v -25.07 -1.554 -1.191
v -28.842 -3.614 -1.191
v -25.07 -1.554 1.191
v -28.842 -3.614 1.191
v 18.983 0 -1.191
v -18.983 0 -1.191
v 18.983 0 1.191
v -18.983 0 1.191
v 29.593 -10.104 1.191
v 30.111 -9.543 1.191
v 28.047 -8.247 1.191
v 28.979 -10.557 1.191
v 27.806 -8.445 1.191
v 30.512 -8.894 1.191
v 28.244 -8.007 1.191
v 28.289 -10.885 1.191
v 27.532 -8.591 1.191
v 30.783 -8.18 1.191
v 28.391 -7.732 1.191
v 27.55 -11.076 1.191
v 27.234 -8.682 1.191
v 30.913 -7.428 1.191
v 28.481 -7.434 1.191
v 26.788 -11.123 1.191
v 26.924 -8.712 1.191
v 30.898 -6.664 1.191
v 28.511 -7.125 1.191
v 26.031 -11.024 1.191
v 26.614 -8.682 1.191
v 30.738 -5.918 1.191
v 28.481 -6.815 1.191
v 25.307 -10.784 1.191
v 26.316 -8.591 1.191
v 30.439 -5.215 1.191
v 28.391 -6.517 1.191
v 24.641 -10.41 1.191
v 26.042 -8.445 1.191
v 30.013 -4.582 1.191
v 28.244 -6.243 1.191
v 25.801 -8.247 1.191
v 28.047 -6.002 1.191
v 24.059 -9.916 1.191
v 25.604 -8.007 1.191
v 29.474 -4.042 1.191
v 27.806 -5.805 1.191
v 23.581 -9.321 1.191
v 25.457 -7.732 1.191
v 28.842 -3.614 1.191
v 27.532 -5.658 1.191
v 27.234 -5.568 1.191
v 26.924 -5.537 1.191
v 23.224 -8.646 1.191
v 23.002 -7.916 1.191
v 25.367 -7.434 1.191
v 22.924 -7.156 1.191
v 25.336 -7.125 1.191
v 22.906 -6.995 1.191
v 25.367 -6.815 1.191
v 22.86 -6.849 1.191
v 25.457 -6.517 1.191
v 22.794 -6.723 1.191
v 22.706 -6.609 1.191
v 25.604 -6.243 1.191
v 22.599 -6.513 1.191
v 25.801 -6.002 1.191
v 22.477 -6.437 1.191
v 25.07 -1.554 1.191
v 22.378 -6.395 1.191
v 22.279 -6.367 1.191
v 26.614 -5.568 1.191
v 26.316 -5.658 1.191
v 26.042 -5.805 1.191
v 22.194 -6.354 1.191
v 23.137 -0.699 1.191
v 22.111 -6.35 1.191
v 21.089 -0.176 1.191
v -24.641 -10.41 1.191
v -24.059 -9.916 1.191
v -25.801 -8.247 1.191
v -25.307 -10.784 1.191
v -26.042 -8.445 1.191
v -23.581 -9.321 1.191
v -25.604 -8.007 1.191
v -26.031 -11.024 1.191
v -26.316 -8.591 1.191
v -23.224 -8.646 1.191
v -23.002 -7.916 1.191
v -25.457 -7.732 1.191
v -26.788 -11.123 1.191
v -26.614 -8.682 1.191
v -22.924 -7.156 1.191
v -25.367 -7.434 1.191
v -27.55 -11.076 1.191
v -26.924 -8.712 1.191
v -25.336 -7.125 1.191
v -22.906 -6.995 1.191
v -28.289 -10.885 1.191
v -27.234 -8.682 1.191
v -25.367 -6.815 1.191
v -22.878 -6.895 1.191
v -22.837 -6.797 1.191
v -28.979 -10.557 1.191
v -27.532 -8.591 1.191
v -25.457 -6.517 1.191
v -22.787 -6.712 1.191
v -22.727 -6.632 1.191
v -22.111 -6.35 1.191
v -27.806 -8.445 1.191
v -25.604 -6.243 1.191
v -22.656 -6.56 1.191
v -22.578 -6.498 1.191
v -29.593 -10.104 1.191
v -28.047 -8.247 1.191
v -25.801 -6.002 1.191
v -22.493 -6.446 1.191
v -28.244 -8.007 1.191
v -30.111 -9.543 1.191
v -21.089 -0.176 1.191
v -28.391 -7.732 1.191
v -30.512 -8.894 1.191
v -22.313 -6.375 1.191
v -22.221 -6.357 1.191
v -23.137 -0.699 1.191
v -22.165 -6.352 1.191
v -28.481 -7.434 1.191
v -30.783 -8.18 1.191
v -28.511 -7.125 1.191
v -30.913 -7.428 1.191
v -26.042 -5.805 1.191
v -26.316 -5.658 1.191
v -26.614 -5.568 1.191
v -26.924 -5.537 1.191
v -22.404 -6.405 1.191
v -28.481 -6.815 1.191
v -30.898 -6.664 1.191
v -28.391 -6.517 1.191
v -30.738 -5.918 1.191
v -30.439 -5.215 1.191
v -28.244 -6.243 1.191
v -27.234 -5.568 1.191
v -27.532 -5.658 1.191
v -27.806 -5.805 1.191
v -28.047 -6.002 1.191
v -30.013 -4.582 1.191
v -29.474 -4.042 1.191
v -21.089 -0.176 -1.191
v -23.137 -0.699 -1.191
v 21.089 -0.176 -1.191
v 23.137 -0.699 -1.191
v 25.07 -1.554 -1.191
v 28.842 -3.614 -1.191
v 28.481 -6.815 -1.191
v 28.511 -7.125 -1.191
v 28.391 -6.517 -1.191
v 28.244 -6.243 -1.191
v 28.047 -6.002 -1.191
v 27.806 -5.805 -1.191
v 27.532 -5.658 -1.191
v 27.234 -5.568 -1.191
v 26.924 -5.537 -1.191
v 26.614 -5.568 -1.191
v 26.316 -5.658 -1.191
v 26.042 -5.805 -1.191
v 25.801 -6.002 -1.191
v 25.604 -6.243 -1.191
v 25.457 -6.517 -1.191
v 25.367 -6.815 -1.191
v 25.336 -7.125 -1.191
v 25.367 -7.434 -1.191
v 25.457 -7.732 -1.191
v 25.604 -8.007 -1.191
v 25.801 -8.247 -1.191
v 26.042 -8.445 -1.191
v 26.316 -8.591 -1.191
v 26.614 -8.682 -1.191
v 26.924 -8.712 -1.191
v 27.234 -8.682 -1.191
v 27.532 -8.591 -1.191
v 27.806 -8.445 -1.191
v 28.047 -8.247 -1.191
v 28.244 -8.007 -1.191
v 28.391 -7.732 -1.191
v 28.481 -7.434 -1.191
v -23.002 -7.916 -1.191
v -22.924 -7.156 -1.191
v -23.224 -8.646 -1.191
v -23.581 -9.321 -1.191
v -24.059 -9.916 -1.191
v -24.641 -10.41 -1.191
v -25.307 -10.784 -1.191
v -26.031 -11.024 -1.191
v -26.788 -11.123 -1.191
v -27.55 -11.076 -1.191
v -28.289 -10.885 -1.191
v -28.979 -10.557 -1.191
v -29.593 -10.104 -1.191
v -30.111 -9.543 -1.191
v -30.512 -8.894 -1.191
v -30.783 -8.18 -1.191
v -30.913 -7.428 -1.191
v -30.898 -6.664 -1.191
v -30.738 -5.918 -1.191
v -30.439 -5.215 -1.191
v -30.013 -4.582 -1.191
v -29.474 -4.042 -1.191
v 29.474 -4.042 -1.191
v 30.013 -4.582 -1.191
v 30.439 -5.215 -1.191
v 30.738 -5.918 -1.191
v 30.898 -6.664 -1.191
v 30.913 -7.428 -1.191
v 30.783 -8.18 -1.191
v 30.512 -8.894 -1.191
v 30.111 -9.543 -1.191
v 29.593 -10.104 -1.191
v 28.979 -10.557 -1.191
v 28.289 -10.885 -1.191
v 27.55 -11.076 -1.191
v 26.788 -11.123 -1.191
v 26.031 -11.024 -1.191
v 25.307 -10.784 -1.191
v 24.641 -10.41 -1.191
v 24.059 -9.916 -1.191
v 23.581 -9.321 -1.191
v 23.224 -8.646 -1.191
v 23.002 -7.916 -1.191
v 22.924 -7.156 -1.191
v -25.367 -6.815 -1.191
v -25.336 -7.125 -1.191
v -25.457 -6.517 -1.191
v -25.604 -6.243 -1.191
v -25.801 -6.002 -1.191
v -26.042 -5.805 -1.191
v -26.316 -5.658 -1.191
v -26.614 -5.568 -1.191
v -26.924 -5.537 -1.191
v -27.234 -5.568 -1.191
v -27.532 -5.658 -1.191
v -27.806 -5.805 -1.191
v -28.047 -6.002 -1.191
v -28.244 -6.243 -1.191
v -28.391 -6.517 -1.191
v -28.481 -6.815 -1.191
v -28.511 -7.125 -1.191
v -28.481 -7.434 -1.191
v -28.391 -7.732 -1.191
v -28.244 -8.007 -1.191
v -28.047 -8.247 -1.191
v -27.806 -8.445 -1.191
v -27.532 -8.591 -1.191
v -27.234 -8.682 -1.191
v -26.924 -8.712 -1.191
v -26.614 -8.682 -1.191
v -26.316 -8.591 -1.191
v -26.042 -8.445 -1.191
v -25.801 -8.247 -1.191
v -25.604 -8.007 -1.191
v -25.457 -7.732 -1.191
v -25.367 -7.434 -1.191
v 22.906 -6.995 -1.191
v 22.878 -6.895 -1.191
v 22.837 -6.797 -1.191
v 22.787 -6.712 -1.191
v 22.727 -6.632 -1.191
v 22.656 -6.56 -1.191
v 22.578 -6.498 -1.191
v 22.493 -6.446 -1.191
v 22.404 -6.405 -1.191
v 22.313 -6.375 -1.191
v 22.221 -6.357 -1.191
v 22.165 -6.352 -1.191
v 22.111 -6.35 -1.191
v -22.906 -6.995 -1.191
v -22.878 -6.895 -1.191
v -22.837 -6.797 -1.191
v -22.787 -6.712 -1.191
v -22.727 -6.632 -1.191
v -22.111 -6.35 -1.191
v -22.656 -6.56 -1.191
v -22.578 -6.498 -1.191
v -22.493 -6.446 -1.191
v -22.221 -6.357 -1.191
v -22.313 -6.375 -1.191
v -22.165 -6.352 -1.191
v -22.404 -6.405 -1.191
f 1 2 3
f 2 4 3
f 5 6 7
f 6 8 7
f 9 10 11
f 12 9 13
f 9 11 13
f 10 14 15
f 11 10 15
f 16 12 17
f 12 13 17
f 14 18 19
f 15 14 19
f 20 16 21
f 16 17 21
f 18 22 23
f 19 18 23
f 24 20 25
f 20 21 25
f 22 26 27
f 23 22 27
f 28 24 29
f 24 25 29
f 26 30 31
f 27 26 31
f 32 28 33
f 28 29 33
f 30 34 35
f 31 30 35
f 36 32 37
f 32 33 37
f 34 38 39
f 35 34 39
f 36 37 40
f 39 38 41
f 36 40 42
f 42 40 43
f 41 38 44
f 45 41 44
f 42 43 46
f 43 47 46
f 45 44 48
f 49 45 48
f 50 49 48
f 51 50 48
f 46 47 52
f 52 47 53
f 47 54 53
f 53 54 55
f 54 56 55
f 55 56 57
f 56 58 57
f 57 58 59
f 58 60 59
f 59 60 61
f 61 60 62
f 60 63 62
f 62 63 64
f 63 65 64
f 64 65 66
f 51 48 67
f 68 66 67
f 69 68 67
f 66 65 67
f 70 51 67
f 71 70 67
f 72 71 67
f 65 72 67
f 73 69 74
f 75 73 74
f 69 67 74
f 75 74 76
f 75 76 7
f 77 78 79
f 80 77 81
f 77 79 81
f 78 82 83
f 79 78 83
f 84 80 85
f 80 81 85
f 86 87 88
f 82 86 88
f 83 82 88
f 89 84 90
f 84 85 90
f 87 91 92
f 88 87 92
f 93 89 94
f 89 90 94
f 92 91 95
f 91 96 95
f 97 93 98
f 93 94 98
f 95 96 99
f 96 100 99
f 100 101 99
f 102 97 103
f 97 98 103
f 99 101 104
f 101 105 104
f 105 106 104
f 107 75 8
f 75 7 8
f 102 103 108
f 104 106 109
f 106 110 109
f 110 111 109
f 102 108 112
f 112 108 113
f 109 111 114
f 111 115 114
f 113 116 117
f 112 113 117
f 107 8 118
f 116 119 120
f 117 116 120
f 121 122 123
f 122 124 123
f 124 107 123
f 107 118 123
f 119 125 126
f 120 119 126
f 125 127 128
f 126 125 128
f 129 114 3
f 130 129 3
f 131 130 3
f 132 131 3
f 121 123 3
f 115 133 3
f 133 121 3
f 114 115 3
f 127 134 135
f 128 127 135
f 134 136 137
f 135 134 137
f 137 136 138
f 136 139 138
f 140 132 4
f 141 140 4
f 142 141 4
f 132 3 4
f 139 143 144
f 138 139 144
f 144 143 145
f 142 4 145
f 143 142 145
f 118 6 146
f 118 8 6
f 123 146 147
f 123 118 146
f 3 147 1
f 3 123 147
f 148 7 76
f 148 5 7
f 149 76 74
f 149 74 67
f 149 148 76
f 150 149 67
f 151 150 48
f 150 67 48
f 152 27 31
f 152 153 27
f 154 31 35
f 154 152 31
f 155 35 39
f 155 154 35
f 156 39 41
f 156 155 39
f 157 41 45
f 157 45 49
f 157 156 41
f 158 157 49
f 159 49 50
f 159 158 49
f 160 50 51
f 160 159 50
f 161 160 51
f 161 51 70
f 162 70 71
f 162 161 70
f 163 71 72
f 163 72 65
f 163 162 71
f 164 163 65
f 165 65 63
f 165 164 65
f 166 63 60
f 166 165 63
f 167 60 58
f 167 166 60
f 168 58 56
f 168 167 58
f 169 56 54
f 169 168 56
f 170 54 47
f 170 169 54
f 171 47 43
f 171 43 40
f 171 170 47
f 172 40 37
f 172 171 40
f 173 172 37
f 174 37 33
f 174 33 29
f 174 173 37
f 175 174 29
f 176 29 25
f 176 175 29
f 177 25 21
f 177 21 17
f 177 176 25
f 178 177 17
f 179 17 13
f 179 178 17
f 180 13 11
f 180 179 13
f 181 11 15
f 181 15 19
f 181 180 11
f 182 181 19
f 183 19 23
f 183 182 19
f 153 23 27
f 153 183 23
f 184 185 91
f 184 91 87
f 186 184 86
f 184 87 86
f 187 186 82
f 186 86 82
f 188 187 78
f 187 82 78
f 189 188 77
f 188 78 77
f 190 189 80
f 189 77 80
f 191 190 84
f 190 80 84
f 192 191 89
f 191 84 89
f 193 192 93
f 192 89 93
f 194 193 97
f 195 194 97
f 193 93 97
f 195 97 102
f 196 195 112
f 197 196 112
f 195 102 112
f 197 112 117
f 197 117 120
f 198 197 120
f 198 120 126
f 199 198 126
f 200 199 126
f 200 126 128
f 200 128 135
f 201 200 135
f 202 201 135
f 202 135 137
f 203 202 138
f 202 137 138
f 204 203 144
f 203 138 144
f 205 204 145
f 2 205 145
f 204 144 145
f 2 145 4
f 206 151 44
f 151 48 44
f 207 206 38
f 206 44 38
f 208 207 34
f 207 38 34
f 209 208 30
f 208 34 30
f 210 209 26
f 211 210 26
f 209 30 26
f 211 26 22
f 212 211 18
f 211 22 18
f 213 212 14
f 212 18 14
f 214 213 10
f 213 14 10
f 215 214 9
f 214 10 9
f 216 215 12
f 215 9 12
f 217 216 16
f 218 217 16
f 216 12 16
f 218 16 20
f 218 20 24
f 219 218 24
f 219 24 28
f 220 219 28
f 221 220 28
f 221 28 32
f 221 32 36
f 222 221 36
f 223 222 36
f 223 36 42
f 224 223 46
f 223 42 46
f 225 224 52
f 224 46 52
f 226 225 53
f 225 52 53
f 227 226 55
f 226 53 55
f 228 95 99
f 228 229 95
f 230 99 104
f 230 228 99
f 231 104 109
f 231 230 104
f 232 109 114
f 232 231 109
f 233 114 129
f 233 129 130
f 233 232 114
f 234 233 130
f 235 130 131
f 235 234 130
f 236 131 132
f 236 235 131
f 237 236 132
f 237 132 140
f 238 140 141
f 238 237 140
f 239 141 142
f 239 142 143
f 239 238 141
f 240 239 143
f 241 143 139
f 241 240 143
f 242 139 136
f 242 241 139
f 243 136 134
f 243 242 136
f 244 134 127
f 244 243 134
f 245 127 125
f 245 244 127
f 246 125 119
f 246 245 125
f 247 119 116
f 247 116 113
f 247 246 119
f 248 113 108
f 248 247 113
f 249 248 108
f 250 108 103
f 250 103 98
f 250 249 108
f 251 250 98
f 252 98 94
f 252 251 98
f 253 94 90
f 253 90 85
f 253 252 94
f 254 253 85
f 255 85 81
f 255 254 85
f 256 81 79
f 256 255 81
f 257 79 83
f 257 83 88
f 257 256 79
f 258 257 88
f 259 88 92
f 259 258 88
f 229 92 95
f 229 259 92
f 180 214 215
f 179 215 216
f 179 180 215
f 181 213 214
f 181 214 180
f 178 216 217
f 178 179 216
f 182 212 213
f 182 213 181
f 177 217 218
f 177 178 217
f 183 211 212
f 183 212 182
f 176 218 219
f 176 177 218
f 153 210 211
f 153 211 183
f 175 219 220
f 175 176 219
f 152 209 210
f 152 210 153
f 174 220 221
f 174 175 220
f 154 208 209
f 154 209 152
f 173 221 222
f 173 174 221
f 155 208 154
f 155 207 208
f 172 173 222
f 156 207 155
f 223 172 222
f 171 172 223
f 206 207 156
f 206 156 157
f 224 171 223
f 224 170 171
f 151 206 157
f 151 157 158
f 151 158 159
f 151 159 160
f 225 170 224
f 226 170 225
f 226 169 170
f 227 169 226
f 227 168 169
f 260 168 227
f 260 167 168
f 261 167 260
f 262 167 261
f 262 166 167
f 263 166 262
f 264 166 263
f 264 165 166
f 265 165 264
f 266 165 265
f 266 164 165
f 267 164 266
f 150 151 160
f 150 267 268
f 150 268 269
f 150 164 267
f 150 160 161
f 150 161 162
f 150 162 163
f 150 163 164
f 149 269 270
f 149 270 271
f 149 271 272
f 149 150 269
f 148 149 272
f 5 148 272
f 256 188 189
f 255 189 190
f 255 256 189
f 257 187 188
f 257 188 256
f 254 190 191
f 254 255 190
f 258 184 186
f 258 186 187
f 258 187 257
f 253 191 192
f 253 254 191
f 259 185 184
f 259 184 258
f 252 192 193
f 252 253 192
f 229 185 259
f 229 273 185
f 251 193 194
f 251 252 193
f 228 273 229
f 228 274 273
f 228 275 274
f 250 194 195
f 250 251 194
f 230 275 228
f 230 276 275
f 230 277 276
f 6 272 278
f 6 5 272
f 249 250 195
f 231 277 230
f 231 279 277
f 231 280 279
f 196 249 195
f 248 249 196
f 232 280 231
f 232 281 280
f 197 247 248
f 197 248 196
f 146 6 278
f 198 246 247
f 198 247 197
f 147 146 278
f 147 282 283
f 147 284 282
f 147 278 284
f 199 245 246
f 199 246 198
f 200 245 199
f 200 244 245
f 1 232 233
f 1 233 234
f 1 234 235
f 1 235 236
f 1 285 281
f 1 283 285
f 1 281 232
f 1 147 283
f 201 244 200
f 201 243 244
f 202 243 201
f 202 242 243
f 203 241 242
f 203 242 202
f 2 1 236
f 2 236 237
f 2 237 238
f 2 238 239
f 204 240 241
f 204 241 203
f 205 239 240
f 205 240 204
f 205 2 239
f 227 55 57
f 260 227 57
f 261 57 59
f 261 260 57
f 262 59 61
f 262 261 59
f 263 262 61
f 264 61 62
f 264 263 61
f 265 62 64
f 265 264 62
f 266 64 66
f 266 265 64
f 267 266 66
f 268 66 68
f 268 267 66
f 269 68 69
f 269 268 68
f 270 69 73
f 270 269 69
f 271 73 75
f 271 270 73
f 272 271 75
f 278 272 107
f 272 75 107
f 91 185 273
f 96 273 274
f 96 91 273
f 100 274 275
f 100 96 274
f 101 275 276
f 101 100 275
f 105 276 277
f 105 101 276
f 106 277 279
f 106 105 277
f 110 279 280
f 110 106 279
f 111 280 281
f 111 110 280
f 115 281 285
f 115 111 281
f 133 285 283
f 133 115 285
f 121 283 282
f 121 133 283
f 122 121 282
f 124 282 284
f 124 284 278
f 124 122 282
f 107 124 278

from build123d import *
from OCP.BRepFilletAPI import BRepFilletAPI_MakeFillet

# Parameters (mm, degrees)
SKETCH1_R           = 1.5875
BOSS_EXTRUDE1_DEPTH = 1.190625
FILLET1_R1          = 12.7
FILLET1_R2          = 0.8128


with BuildPart() as part:
    # Sketch1 → Boss-Extrude1 (new, symmetric)
    with BuildSketch(Plane.XY):
        with BuildLine():
            Line((-22.225, 0), (22.225, 0))
            Line((22.225, 0), (28.841565542, -3.6137254))
            ThreePointArc((28.841565542, -3.6137254), (28.965173596, -10.565282887), (22.9235, -7.1247))
            Line((22.9235, -7.1247), (22.9235, -6.35))
            Line((22.9235, -6.35), (-22.9235, -6.35))
            Line((-22.9235, -6.35), (-22.9235, -7.1247))
            ThreePointArc((-22.9235, -7.1247), (-28.965173596, -10.565282887), (-28.841565542, -3.6137254))
            Line((-28.841565542, -3.6137254), (-22.225, 0))
        make_face()
        with Locations((-26.924, -7.1247)):
            Circle(SKETCH1_R, mode=Mode.SUBTRACT)
        with Locations((26.924, -7.1247)):
            Circle(SKETCH1_R, mode=Mode.SUBTRACT)
    extrude(amount=BOSS_EXTRUDE1_DEPTH, both=True)

    # Fillet1: one fillet with a radius per group of edges: ONE call of the kernel's fillet builder (fillet() takes one radius for all edges)
    fillet1_edges_1 = [part.edges().sort_by_distance(p)[0] for p in [
        (-22.225, 0, 0),
        (22.225, 0, 0),
    ]]
    fillet1_edges_2 = [part.edges().sort_by_distance(p)[0] for p in [
        (-22.9235, -6.35, 0),
        (22.9235, -6.35, 0),
    ]]
    fillet1 = BRepFilletAPI_MakeFillet(part.part.solid().wrapped)
    for e in fillet1_edges_1:
        fillet1.Add(FILLET1_R1, e.wrapped)
    for e in fillet1_edges_2:
        fillet1.Add(FILLET1_R2, e.wrapped)
    add(Compound.cast(fillet1.Shape()), mode=Mode.REPLACE)


solid = part.part
